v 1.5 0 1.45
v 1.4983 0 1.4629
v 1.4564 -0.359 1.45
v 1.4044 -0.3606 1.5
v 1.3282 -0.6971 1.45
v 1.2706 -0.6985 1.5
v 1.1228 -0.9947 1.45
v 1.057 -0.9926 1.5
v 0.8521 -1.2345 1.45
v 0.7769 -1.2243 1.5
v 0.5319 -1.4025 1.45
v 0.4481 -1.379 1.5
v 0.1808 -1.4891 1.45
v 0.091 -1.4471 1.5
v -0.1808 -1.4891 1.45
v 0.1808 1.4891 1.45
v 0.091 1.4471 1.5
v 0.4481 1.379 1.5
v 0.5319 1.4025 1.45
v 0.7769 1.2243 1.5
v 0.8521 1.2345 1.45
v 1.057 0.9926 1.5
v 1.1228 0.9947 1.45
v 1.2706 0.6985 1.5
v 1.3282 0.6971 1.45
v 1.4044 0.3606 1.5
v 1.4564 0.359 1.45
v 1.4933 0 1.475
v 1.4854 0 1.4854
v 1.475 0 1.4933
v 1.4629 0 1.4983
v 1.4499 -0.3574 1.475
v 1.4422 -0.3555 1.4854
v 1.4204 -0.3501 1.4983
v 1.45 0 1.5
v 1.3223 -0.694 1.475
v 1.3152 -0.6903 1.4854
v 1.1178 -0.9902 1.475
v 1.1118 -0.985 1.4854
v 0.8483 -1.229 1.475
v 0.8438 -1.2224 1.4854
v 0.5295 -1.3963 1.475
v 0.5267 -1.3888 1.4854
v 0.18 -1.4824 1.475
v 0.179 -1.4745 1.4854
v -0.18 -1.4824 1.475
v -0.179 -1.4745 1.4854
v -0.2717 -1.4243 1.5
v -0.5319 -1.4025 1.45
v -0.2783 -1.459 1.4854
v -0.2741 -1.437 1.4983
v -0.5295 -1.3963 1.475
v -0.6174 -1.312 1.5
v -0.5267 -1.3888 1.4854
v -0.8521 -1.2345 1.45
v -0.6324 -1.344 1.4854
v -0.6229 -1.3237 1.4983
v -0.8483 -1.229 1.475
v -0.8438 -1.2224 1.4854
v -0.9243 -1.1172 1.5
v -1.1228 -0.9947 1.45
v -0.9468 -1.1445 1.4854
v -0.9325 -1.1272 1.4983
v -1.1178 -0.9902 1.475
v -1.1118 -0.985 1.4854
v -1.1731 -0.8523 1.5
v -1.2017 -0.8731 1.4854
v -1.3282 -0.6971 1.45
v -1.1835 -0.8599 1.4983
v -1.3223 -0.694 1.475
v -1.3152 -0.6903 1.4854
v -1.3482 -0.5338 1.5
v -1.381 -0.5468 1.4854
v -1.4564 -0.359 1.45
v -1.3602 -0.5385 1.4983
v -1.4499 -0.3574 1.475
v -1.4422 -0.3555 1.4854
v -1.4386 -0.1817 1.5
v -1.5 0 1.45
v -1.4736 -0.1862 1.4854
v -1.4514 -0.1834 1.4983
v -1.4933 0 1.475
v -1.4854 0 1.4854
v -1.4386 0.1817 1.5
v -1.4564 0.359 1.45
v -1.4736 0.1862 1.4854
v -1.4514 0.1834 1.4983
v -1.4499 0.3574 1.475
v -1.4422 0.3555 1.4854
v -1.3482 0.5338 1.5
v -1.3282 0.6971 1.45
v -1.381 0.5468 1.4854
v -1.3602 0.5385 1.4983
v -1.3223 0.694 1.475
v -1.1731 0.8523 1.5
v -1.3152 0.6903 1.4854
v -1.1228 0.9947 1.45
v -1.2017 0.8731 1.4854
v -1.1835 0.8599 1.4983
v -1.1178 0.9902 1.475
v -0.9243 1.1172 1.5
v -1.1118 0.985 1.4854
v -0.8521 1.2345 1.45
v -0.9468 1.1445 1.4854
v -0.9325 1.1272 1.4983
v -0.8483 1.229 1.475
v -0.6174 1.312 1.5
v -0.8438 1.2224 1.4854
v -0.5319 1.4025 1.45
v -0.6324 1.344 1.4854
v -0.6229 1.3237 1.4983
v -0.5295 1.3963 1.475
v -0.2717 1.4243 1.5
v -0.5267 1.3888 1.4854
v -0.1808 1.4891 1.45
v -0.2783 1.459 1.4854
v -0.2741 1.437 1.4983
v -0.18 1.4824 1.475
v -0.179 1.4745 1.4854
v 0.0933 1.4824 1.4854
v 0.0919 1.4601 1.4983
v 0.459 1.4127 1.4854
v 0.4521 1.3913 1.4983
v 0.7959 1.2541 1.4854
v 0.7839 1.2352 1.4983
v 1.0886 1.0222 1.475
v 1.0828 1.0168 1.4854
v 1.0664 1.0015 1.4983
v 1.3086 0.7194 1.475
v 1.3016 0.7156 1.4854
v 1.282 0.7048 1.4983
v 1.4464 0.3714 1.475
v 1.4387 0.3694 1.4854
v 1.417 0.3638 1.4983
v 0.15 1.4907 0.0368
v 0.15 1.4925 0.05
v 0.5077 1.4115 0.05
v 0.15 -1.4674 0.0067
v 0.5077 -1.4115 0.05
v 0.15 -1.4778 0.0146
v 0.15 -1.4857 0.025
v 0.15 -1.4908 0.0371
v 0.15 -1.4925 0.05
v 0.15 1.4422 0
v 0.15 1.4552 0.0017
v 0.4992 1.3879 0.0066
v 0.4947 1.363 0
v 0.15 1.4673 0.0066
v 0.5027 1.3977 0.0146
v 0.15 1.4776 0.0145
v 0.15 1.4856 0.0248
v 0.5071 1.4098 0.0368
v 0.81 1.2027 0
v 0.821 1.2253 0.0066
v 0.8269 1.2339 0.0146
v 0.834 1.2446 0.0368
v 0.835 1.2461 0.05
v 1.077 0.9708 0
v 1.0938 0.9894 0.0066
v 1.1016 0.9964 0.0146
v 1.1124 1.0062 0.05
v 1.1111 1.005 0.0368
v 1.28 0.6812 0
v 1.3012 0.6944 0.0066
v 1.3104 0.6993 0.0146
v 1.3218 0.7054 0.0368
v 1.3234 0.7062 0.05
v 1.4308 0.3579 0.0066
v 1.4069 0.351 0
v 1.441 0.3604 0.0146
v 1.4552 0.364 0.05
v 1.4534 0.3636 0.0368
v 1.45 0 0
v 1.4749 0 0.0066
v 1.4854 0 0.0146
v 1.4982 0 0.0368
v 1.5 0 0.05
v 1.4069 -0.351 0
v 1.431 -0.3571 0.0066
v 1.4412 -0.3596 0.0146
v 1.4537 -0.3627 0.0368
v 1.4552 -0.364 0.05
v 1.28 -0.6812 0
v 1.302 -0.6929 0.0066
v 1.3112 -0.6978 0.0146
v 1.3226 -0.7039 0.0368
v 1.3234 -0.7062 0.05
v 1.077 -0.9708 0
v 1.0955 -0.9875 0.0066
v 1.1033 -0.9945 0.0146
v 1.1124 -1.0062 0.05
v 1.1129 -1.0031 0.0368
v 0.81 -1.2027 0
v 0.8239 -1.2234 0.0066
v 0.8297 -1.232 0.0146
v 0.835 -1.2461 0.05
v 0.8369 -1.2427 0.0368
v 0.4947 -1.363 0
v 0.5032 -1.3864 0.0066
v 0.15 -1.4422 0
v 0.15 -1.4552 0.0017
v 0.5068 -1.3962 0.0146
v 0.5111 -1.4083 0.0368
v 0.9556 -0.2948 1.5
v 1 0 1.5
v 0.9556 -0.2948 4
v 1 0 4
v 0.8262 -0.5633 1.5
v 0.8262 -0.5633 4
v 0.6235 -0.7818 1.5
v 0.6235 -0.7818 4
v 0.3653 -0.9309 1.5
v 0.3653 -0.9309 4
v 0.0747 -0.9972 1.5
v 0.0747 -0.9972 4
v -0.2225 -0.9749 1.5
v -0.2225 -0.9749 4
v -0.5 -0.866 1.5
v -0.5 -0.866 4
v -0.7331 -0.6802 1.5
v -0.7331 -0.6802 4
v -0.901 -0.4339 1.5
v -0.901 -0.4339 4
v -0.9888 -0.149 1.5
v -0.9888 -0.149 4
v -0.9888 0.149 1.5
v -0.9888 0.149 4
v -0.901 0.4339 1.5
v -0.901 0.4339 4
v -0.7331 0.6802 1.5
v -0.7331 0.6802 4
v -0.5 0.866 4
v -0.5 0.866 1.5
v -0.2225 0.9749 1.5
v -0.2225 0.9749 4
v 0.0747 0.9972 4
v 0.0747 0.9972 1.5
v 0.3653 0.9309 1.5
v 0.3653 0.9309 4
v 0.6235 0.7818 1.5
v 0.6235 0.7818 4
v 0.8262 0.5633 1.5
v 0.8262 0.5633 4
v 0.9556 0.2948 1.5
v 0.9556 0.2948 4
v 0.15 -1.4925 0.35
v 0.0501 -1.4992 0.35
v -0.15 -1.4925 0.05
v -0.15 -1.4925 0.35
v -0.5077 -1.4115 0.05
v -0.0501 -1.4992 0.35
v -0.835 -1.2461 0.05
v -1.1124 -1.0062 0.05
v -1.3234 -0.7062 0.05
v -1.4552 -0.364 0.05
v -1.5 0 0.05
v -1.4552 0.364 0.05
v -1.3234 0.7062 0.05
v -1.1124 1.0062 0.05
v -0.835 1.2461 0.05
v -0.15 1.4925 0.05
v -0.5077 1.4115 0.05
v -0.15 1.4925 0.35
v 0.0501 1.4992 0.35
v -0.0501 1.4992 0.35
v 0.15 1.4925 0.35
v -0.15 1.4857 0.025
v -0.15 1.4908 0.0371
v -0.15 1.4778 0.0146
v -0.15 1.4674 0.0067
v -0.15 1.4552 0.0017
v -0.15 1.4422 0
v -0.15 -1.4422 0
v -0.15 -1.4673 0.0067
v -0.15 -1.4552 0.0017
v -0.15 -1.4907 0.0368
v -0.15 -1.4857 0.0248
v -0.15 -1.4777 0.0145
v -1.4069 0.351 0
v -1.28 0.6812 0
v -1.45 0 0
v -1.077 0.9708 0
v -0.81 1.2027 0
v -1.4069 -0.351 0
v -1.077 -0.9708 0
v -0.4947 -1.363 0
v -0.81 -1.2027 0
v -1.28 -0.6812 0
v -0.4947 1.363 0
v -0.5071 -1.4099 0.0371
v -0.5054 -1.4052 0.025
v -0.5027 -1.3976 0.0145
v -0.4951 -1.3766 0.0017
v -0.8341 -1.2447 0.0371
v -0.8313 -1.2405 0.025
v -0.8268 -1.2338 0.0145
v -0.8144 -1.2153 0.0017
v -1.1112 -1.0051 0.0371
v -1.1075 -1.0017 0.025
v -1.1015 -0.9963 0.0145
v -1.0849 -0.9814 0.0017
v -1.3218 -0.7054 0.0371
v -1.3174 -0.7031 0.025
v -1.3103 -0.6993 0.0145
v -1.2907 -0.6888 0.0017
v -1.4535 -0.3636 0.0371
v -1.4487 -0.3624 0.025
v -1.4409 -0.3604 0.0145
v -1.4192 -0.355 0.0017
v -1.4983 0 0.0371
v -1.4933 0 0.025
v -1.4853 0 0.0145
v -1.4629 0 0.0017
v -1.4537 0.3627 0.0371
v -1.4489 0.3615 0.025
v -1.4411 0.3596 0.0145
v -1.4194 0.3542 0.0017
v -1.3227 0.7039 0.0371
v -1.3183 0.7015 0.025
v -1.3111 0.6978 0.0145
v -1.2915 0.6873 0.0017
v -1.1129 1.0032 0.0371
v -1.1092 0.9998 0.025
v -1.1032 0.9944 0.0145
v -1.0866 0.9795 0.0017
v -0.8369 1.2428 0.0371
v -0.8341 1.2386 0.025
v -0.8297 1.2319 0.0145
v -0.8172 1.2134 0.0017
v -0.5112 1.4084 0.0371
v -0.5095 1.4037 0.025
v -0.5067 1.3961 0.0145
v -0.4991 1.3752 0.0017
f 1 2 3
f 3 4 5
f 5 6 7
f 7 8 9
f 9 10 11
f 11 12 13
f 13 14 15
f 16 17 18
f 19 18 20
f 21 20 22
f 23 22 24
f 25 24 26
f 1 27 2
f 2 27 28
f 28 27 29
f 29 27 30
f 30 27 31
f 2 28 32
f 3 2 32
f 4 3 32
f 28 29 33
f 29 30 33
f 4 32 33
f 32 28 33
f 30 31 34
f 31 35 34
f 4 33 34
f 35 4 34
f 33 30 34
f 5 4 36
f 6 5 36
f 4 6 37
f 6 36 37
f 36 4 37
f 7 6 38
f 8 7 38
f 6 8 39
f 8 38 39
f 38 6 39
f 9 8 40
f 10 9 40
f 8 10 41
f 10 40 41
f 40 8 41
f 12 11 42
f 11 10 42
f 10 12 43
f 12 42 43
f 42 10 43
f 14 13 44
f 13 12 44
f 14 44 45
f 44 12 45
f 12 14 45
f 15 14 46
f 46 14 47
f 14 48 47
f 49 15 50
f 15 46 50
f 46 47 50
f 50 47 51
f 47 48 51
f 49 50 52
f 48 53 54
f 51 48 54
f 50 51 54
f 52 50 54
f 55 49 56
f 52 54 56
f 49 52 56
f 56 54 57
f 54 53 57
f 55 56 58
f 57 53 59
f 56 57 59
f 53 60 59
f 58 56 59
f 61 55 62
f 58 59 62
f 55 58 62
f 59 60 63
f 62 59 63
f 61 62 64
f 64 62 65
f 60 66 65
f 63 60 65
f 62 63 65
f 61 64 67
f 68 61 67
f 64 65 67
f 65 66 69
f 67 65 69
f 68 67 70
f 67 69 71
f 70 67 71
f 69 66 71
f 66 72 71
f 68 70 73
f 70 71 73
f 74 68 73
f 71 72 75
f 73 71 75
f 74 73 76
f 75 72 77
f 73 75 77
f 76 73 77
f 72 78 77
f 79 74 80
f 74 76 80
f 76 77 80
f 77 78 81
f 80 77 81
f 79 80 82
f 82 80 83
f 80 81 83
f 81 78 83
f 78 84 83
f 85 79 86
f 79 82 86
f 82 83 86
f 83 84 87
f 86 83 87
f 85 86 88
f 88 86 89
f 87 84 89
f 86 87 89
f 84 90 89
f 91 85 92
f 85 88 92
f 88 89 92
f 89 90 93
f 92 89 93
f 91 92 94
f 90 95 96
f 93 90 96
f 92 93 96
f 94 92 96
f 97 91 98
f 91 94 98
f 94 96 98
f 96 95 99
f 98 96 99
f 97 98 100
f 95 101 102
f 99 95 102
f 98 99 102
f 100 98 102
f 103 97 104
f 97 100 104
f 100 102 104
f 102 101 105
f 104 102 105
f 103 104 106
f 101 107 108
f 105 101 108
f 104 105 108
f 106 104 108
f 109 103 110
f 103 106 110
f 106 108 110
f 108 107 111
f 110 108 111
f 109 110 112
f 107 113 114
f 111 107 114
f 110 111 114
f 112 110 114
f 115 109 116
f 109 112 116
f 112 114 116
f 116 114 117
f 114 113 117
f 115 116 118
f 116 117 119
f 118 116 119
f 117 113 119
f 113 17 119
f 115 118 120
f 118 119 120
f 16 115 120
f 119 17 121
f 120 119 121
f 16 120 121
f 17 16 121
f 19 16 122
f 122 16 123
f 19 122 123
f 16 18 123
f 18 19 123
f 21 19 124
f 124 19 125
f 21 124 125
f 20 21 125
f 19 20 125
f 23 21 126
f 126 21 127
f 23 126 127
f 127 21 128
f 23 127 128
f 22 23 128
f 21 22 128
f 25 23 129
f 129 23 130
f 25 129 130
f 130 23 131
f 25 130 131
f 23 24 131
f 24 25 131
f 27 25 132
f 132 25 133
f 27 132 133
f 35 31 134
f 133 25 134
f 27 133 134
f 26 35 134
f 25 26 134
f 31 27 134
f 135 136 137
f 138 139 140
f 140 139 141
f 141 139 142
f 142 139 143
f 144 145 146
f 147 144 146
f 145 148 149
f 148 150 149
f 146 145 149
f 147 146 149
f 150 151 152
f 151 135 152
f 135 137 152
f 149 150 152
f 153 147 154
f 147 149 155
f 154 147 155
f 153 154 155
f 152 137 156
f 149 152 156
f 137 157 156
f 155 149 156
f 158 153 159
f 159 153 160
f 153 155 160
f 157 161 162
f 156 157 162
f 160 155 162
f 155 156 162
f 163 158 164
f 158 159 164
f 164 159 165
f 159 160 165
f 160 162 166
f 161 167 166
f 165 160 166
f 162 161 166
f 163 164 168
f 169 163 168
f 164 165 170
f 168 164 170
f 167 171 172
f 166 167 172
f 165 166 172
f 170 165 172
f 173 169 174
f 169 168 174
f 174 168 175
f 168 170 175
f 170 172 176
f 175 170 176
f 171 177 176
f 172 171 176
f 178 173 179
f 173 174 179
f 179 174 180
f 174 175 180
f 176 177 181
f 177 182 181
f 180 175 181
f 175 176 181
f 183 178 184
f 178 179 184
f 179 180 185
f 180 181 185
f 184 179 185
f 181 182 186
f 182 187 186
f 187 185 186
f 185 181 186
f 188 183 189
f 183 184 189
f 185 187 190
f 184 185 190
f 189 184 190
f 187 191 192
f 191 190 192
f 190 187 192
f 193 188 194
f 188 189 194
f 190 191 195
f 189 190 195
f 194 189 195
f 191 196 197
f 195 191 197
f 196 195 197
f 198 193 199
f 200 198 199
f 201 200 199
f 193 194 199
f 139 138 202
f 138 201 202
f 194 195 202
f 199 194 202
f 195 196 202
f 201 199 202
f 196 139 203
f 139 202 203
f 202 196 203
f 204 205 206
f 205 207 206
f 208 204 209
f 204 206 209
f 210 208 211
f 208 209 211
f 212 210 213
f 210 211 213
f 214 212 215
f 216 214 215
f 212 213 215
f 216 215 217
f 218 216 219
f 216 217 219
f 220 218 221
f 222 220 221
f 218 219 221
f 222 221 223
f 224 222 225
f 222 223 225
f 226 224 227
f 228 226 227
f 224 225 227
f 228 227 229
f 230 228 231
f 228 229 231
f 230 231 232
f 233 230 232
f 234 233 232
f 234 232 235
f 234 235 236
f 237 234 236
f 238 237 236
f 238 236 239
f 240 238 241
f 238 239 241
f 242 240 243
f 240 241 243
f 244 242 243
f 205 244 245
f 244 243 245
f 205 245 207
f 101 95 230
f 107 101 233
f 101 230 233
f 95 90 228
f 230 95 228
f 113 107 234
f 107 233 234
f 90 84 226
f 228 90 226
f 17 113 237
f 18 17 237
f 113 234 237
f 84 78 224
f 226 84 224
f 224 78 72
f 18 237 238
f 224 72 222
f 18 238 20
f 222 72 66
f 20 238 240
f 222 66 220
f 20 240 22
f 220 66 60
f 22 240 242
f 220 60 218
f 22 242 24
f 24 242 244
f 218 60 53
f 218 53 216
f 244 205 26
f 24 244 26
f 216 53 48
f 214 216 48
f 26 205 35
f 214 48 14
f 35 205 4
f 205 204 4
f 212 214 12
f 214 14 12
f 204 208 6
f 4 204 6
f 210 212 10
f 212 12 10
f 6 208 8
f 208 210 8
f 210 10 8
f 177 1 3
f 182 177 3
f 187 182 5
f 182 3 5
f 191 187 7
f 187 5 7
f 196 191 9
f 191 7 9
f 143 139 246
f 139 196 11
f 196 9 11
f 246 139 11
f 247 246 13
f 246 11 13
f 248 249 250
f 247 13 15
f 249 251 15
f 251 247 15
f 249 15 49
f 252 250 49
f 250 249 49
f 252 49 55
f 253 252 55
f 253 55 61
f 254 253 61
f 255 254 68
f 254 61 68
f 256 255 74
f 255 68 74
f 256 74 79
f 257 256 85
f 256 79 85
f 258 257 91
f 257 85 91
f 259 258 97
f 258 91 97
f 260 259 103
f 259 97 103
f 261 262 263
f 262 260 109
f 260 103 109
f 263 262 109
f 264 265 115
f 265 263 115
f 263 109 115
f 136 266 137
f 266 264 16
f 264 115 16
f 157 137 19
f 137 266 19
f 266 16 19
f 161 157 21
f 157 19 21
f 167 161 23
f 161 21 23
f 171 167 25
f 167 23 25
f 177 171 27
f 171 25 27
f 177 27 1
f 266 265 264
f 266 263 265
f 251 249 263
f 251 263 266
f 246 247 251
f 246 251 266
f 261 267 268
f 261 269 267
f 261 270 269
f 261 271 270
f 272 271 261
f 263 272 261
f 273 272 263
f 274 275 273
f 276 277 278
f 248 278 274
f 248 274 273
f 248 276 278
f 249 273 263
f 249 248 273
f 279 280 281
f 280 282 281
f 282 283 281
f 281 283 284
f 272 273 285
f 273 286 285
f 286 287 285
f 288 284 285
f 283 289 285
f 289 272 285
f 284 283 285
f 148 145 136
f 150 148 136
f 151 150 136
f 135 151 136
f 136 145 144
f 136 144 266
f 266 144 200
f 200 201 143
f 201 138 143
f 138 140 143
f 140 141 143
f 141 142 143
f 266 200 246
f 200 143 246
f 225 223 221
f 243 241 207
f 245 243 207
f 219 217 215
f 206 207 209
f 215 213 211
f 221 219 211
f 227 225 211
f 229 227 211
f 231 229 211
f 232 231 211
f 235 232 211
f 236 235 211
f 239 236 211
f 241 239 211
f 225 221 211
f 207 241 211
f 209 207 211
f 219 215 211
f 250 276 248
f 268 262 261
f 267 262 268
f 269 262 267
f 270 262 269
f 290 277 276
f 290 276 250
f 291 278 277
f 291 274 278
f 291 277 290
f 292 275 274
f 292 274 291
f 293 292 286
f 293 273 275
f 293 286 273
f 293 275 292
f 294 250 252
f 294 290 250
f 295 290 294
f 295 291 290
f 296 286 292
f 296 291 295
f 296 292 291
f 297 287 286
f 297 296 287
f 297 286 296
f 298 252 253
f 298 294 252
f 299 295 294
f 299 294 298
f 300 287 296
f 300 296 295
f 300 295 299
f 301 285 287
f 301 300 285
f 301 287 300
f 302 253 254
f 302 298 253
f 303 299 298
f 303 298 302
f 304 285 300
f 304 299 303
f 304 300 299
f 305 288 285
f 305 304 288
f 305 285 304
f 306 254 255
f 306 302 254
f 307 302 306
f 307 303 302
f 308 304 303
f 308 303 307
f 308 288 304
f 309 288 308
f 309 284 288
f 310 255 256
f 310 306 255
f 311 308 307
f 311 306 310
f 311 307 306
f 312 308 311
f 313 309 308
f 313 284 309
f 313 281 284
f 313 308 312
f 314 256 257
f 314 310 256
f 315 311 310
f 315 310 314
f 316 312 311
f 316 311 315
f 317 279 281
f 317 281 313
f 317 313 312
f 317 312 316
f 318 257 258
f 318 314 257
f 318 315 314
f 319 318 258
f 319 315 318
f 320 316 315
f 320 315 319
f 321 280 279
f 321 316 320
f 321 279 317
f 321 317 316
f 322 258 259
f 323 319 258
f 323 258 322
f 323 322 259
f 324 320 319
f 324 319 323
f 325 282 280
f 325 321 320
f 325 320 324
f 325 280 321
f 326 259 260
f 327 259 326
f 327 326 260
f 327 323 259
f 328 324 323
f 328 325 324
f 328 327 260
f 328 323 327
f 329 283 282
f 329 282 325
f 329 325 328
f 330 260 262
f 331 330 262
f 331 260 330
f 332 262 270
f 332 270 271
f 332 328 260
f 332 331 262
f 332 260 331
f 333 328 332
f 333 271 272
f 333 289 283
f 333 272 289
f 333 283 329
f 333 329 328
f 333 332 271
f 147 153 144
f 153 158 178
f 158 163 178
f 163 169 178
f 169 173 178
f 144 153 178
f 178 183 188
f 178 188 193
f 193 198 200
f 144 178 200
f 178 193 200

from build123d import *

# Parameters (mm, degrees)
F2_W     = 0.3
F2_H     = 0.35
F3_DEPTH = 12.5
F4_R     = 0.05


with BuildPart() as f1:
    # F0 (on Front) → F1 (revolve)
    with BuildSketch(Plane.XZ):
        Polygon((0, 4), (0, 0), (1.5, 0), (1.5, 1.5), (1, 1.5), (1, 4), align=None)
    revolve(axis=Axis((0, 0, 2), (0, 0, -1)))

    # F2 (on Front) → F3 (cut, symmetric)
    with BuildSketch(Plane.XZ):
        with Locations((0, 0.175)):
            Rectangle(F2_W, F2_H)
    extrude(amount=F3_DEPTH, both=True, mode=Mode.SUBTRACT)

    # F4
    f4_edges = [f1.edges().sort_by_distance(p)[0] for p in [
        (-1.5, 0, 1.5),
        (1.11243, -1.006231, 0),
        (1.11243, 1.006231, 0),
        (-1.5, 0, 0),
    ]]
    fillet(f4_edges, radius=F4_R)


solid = f1.part
